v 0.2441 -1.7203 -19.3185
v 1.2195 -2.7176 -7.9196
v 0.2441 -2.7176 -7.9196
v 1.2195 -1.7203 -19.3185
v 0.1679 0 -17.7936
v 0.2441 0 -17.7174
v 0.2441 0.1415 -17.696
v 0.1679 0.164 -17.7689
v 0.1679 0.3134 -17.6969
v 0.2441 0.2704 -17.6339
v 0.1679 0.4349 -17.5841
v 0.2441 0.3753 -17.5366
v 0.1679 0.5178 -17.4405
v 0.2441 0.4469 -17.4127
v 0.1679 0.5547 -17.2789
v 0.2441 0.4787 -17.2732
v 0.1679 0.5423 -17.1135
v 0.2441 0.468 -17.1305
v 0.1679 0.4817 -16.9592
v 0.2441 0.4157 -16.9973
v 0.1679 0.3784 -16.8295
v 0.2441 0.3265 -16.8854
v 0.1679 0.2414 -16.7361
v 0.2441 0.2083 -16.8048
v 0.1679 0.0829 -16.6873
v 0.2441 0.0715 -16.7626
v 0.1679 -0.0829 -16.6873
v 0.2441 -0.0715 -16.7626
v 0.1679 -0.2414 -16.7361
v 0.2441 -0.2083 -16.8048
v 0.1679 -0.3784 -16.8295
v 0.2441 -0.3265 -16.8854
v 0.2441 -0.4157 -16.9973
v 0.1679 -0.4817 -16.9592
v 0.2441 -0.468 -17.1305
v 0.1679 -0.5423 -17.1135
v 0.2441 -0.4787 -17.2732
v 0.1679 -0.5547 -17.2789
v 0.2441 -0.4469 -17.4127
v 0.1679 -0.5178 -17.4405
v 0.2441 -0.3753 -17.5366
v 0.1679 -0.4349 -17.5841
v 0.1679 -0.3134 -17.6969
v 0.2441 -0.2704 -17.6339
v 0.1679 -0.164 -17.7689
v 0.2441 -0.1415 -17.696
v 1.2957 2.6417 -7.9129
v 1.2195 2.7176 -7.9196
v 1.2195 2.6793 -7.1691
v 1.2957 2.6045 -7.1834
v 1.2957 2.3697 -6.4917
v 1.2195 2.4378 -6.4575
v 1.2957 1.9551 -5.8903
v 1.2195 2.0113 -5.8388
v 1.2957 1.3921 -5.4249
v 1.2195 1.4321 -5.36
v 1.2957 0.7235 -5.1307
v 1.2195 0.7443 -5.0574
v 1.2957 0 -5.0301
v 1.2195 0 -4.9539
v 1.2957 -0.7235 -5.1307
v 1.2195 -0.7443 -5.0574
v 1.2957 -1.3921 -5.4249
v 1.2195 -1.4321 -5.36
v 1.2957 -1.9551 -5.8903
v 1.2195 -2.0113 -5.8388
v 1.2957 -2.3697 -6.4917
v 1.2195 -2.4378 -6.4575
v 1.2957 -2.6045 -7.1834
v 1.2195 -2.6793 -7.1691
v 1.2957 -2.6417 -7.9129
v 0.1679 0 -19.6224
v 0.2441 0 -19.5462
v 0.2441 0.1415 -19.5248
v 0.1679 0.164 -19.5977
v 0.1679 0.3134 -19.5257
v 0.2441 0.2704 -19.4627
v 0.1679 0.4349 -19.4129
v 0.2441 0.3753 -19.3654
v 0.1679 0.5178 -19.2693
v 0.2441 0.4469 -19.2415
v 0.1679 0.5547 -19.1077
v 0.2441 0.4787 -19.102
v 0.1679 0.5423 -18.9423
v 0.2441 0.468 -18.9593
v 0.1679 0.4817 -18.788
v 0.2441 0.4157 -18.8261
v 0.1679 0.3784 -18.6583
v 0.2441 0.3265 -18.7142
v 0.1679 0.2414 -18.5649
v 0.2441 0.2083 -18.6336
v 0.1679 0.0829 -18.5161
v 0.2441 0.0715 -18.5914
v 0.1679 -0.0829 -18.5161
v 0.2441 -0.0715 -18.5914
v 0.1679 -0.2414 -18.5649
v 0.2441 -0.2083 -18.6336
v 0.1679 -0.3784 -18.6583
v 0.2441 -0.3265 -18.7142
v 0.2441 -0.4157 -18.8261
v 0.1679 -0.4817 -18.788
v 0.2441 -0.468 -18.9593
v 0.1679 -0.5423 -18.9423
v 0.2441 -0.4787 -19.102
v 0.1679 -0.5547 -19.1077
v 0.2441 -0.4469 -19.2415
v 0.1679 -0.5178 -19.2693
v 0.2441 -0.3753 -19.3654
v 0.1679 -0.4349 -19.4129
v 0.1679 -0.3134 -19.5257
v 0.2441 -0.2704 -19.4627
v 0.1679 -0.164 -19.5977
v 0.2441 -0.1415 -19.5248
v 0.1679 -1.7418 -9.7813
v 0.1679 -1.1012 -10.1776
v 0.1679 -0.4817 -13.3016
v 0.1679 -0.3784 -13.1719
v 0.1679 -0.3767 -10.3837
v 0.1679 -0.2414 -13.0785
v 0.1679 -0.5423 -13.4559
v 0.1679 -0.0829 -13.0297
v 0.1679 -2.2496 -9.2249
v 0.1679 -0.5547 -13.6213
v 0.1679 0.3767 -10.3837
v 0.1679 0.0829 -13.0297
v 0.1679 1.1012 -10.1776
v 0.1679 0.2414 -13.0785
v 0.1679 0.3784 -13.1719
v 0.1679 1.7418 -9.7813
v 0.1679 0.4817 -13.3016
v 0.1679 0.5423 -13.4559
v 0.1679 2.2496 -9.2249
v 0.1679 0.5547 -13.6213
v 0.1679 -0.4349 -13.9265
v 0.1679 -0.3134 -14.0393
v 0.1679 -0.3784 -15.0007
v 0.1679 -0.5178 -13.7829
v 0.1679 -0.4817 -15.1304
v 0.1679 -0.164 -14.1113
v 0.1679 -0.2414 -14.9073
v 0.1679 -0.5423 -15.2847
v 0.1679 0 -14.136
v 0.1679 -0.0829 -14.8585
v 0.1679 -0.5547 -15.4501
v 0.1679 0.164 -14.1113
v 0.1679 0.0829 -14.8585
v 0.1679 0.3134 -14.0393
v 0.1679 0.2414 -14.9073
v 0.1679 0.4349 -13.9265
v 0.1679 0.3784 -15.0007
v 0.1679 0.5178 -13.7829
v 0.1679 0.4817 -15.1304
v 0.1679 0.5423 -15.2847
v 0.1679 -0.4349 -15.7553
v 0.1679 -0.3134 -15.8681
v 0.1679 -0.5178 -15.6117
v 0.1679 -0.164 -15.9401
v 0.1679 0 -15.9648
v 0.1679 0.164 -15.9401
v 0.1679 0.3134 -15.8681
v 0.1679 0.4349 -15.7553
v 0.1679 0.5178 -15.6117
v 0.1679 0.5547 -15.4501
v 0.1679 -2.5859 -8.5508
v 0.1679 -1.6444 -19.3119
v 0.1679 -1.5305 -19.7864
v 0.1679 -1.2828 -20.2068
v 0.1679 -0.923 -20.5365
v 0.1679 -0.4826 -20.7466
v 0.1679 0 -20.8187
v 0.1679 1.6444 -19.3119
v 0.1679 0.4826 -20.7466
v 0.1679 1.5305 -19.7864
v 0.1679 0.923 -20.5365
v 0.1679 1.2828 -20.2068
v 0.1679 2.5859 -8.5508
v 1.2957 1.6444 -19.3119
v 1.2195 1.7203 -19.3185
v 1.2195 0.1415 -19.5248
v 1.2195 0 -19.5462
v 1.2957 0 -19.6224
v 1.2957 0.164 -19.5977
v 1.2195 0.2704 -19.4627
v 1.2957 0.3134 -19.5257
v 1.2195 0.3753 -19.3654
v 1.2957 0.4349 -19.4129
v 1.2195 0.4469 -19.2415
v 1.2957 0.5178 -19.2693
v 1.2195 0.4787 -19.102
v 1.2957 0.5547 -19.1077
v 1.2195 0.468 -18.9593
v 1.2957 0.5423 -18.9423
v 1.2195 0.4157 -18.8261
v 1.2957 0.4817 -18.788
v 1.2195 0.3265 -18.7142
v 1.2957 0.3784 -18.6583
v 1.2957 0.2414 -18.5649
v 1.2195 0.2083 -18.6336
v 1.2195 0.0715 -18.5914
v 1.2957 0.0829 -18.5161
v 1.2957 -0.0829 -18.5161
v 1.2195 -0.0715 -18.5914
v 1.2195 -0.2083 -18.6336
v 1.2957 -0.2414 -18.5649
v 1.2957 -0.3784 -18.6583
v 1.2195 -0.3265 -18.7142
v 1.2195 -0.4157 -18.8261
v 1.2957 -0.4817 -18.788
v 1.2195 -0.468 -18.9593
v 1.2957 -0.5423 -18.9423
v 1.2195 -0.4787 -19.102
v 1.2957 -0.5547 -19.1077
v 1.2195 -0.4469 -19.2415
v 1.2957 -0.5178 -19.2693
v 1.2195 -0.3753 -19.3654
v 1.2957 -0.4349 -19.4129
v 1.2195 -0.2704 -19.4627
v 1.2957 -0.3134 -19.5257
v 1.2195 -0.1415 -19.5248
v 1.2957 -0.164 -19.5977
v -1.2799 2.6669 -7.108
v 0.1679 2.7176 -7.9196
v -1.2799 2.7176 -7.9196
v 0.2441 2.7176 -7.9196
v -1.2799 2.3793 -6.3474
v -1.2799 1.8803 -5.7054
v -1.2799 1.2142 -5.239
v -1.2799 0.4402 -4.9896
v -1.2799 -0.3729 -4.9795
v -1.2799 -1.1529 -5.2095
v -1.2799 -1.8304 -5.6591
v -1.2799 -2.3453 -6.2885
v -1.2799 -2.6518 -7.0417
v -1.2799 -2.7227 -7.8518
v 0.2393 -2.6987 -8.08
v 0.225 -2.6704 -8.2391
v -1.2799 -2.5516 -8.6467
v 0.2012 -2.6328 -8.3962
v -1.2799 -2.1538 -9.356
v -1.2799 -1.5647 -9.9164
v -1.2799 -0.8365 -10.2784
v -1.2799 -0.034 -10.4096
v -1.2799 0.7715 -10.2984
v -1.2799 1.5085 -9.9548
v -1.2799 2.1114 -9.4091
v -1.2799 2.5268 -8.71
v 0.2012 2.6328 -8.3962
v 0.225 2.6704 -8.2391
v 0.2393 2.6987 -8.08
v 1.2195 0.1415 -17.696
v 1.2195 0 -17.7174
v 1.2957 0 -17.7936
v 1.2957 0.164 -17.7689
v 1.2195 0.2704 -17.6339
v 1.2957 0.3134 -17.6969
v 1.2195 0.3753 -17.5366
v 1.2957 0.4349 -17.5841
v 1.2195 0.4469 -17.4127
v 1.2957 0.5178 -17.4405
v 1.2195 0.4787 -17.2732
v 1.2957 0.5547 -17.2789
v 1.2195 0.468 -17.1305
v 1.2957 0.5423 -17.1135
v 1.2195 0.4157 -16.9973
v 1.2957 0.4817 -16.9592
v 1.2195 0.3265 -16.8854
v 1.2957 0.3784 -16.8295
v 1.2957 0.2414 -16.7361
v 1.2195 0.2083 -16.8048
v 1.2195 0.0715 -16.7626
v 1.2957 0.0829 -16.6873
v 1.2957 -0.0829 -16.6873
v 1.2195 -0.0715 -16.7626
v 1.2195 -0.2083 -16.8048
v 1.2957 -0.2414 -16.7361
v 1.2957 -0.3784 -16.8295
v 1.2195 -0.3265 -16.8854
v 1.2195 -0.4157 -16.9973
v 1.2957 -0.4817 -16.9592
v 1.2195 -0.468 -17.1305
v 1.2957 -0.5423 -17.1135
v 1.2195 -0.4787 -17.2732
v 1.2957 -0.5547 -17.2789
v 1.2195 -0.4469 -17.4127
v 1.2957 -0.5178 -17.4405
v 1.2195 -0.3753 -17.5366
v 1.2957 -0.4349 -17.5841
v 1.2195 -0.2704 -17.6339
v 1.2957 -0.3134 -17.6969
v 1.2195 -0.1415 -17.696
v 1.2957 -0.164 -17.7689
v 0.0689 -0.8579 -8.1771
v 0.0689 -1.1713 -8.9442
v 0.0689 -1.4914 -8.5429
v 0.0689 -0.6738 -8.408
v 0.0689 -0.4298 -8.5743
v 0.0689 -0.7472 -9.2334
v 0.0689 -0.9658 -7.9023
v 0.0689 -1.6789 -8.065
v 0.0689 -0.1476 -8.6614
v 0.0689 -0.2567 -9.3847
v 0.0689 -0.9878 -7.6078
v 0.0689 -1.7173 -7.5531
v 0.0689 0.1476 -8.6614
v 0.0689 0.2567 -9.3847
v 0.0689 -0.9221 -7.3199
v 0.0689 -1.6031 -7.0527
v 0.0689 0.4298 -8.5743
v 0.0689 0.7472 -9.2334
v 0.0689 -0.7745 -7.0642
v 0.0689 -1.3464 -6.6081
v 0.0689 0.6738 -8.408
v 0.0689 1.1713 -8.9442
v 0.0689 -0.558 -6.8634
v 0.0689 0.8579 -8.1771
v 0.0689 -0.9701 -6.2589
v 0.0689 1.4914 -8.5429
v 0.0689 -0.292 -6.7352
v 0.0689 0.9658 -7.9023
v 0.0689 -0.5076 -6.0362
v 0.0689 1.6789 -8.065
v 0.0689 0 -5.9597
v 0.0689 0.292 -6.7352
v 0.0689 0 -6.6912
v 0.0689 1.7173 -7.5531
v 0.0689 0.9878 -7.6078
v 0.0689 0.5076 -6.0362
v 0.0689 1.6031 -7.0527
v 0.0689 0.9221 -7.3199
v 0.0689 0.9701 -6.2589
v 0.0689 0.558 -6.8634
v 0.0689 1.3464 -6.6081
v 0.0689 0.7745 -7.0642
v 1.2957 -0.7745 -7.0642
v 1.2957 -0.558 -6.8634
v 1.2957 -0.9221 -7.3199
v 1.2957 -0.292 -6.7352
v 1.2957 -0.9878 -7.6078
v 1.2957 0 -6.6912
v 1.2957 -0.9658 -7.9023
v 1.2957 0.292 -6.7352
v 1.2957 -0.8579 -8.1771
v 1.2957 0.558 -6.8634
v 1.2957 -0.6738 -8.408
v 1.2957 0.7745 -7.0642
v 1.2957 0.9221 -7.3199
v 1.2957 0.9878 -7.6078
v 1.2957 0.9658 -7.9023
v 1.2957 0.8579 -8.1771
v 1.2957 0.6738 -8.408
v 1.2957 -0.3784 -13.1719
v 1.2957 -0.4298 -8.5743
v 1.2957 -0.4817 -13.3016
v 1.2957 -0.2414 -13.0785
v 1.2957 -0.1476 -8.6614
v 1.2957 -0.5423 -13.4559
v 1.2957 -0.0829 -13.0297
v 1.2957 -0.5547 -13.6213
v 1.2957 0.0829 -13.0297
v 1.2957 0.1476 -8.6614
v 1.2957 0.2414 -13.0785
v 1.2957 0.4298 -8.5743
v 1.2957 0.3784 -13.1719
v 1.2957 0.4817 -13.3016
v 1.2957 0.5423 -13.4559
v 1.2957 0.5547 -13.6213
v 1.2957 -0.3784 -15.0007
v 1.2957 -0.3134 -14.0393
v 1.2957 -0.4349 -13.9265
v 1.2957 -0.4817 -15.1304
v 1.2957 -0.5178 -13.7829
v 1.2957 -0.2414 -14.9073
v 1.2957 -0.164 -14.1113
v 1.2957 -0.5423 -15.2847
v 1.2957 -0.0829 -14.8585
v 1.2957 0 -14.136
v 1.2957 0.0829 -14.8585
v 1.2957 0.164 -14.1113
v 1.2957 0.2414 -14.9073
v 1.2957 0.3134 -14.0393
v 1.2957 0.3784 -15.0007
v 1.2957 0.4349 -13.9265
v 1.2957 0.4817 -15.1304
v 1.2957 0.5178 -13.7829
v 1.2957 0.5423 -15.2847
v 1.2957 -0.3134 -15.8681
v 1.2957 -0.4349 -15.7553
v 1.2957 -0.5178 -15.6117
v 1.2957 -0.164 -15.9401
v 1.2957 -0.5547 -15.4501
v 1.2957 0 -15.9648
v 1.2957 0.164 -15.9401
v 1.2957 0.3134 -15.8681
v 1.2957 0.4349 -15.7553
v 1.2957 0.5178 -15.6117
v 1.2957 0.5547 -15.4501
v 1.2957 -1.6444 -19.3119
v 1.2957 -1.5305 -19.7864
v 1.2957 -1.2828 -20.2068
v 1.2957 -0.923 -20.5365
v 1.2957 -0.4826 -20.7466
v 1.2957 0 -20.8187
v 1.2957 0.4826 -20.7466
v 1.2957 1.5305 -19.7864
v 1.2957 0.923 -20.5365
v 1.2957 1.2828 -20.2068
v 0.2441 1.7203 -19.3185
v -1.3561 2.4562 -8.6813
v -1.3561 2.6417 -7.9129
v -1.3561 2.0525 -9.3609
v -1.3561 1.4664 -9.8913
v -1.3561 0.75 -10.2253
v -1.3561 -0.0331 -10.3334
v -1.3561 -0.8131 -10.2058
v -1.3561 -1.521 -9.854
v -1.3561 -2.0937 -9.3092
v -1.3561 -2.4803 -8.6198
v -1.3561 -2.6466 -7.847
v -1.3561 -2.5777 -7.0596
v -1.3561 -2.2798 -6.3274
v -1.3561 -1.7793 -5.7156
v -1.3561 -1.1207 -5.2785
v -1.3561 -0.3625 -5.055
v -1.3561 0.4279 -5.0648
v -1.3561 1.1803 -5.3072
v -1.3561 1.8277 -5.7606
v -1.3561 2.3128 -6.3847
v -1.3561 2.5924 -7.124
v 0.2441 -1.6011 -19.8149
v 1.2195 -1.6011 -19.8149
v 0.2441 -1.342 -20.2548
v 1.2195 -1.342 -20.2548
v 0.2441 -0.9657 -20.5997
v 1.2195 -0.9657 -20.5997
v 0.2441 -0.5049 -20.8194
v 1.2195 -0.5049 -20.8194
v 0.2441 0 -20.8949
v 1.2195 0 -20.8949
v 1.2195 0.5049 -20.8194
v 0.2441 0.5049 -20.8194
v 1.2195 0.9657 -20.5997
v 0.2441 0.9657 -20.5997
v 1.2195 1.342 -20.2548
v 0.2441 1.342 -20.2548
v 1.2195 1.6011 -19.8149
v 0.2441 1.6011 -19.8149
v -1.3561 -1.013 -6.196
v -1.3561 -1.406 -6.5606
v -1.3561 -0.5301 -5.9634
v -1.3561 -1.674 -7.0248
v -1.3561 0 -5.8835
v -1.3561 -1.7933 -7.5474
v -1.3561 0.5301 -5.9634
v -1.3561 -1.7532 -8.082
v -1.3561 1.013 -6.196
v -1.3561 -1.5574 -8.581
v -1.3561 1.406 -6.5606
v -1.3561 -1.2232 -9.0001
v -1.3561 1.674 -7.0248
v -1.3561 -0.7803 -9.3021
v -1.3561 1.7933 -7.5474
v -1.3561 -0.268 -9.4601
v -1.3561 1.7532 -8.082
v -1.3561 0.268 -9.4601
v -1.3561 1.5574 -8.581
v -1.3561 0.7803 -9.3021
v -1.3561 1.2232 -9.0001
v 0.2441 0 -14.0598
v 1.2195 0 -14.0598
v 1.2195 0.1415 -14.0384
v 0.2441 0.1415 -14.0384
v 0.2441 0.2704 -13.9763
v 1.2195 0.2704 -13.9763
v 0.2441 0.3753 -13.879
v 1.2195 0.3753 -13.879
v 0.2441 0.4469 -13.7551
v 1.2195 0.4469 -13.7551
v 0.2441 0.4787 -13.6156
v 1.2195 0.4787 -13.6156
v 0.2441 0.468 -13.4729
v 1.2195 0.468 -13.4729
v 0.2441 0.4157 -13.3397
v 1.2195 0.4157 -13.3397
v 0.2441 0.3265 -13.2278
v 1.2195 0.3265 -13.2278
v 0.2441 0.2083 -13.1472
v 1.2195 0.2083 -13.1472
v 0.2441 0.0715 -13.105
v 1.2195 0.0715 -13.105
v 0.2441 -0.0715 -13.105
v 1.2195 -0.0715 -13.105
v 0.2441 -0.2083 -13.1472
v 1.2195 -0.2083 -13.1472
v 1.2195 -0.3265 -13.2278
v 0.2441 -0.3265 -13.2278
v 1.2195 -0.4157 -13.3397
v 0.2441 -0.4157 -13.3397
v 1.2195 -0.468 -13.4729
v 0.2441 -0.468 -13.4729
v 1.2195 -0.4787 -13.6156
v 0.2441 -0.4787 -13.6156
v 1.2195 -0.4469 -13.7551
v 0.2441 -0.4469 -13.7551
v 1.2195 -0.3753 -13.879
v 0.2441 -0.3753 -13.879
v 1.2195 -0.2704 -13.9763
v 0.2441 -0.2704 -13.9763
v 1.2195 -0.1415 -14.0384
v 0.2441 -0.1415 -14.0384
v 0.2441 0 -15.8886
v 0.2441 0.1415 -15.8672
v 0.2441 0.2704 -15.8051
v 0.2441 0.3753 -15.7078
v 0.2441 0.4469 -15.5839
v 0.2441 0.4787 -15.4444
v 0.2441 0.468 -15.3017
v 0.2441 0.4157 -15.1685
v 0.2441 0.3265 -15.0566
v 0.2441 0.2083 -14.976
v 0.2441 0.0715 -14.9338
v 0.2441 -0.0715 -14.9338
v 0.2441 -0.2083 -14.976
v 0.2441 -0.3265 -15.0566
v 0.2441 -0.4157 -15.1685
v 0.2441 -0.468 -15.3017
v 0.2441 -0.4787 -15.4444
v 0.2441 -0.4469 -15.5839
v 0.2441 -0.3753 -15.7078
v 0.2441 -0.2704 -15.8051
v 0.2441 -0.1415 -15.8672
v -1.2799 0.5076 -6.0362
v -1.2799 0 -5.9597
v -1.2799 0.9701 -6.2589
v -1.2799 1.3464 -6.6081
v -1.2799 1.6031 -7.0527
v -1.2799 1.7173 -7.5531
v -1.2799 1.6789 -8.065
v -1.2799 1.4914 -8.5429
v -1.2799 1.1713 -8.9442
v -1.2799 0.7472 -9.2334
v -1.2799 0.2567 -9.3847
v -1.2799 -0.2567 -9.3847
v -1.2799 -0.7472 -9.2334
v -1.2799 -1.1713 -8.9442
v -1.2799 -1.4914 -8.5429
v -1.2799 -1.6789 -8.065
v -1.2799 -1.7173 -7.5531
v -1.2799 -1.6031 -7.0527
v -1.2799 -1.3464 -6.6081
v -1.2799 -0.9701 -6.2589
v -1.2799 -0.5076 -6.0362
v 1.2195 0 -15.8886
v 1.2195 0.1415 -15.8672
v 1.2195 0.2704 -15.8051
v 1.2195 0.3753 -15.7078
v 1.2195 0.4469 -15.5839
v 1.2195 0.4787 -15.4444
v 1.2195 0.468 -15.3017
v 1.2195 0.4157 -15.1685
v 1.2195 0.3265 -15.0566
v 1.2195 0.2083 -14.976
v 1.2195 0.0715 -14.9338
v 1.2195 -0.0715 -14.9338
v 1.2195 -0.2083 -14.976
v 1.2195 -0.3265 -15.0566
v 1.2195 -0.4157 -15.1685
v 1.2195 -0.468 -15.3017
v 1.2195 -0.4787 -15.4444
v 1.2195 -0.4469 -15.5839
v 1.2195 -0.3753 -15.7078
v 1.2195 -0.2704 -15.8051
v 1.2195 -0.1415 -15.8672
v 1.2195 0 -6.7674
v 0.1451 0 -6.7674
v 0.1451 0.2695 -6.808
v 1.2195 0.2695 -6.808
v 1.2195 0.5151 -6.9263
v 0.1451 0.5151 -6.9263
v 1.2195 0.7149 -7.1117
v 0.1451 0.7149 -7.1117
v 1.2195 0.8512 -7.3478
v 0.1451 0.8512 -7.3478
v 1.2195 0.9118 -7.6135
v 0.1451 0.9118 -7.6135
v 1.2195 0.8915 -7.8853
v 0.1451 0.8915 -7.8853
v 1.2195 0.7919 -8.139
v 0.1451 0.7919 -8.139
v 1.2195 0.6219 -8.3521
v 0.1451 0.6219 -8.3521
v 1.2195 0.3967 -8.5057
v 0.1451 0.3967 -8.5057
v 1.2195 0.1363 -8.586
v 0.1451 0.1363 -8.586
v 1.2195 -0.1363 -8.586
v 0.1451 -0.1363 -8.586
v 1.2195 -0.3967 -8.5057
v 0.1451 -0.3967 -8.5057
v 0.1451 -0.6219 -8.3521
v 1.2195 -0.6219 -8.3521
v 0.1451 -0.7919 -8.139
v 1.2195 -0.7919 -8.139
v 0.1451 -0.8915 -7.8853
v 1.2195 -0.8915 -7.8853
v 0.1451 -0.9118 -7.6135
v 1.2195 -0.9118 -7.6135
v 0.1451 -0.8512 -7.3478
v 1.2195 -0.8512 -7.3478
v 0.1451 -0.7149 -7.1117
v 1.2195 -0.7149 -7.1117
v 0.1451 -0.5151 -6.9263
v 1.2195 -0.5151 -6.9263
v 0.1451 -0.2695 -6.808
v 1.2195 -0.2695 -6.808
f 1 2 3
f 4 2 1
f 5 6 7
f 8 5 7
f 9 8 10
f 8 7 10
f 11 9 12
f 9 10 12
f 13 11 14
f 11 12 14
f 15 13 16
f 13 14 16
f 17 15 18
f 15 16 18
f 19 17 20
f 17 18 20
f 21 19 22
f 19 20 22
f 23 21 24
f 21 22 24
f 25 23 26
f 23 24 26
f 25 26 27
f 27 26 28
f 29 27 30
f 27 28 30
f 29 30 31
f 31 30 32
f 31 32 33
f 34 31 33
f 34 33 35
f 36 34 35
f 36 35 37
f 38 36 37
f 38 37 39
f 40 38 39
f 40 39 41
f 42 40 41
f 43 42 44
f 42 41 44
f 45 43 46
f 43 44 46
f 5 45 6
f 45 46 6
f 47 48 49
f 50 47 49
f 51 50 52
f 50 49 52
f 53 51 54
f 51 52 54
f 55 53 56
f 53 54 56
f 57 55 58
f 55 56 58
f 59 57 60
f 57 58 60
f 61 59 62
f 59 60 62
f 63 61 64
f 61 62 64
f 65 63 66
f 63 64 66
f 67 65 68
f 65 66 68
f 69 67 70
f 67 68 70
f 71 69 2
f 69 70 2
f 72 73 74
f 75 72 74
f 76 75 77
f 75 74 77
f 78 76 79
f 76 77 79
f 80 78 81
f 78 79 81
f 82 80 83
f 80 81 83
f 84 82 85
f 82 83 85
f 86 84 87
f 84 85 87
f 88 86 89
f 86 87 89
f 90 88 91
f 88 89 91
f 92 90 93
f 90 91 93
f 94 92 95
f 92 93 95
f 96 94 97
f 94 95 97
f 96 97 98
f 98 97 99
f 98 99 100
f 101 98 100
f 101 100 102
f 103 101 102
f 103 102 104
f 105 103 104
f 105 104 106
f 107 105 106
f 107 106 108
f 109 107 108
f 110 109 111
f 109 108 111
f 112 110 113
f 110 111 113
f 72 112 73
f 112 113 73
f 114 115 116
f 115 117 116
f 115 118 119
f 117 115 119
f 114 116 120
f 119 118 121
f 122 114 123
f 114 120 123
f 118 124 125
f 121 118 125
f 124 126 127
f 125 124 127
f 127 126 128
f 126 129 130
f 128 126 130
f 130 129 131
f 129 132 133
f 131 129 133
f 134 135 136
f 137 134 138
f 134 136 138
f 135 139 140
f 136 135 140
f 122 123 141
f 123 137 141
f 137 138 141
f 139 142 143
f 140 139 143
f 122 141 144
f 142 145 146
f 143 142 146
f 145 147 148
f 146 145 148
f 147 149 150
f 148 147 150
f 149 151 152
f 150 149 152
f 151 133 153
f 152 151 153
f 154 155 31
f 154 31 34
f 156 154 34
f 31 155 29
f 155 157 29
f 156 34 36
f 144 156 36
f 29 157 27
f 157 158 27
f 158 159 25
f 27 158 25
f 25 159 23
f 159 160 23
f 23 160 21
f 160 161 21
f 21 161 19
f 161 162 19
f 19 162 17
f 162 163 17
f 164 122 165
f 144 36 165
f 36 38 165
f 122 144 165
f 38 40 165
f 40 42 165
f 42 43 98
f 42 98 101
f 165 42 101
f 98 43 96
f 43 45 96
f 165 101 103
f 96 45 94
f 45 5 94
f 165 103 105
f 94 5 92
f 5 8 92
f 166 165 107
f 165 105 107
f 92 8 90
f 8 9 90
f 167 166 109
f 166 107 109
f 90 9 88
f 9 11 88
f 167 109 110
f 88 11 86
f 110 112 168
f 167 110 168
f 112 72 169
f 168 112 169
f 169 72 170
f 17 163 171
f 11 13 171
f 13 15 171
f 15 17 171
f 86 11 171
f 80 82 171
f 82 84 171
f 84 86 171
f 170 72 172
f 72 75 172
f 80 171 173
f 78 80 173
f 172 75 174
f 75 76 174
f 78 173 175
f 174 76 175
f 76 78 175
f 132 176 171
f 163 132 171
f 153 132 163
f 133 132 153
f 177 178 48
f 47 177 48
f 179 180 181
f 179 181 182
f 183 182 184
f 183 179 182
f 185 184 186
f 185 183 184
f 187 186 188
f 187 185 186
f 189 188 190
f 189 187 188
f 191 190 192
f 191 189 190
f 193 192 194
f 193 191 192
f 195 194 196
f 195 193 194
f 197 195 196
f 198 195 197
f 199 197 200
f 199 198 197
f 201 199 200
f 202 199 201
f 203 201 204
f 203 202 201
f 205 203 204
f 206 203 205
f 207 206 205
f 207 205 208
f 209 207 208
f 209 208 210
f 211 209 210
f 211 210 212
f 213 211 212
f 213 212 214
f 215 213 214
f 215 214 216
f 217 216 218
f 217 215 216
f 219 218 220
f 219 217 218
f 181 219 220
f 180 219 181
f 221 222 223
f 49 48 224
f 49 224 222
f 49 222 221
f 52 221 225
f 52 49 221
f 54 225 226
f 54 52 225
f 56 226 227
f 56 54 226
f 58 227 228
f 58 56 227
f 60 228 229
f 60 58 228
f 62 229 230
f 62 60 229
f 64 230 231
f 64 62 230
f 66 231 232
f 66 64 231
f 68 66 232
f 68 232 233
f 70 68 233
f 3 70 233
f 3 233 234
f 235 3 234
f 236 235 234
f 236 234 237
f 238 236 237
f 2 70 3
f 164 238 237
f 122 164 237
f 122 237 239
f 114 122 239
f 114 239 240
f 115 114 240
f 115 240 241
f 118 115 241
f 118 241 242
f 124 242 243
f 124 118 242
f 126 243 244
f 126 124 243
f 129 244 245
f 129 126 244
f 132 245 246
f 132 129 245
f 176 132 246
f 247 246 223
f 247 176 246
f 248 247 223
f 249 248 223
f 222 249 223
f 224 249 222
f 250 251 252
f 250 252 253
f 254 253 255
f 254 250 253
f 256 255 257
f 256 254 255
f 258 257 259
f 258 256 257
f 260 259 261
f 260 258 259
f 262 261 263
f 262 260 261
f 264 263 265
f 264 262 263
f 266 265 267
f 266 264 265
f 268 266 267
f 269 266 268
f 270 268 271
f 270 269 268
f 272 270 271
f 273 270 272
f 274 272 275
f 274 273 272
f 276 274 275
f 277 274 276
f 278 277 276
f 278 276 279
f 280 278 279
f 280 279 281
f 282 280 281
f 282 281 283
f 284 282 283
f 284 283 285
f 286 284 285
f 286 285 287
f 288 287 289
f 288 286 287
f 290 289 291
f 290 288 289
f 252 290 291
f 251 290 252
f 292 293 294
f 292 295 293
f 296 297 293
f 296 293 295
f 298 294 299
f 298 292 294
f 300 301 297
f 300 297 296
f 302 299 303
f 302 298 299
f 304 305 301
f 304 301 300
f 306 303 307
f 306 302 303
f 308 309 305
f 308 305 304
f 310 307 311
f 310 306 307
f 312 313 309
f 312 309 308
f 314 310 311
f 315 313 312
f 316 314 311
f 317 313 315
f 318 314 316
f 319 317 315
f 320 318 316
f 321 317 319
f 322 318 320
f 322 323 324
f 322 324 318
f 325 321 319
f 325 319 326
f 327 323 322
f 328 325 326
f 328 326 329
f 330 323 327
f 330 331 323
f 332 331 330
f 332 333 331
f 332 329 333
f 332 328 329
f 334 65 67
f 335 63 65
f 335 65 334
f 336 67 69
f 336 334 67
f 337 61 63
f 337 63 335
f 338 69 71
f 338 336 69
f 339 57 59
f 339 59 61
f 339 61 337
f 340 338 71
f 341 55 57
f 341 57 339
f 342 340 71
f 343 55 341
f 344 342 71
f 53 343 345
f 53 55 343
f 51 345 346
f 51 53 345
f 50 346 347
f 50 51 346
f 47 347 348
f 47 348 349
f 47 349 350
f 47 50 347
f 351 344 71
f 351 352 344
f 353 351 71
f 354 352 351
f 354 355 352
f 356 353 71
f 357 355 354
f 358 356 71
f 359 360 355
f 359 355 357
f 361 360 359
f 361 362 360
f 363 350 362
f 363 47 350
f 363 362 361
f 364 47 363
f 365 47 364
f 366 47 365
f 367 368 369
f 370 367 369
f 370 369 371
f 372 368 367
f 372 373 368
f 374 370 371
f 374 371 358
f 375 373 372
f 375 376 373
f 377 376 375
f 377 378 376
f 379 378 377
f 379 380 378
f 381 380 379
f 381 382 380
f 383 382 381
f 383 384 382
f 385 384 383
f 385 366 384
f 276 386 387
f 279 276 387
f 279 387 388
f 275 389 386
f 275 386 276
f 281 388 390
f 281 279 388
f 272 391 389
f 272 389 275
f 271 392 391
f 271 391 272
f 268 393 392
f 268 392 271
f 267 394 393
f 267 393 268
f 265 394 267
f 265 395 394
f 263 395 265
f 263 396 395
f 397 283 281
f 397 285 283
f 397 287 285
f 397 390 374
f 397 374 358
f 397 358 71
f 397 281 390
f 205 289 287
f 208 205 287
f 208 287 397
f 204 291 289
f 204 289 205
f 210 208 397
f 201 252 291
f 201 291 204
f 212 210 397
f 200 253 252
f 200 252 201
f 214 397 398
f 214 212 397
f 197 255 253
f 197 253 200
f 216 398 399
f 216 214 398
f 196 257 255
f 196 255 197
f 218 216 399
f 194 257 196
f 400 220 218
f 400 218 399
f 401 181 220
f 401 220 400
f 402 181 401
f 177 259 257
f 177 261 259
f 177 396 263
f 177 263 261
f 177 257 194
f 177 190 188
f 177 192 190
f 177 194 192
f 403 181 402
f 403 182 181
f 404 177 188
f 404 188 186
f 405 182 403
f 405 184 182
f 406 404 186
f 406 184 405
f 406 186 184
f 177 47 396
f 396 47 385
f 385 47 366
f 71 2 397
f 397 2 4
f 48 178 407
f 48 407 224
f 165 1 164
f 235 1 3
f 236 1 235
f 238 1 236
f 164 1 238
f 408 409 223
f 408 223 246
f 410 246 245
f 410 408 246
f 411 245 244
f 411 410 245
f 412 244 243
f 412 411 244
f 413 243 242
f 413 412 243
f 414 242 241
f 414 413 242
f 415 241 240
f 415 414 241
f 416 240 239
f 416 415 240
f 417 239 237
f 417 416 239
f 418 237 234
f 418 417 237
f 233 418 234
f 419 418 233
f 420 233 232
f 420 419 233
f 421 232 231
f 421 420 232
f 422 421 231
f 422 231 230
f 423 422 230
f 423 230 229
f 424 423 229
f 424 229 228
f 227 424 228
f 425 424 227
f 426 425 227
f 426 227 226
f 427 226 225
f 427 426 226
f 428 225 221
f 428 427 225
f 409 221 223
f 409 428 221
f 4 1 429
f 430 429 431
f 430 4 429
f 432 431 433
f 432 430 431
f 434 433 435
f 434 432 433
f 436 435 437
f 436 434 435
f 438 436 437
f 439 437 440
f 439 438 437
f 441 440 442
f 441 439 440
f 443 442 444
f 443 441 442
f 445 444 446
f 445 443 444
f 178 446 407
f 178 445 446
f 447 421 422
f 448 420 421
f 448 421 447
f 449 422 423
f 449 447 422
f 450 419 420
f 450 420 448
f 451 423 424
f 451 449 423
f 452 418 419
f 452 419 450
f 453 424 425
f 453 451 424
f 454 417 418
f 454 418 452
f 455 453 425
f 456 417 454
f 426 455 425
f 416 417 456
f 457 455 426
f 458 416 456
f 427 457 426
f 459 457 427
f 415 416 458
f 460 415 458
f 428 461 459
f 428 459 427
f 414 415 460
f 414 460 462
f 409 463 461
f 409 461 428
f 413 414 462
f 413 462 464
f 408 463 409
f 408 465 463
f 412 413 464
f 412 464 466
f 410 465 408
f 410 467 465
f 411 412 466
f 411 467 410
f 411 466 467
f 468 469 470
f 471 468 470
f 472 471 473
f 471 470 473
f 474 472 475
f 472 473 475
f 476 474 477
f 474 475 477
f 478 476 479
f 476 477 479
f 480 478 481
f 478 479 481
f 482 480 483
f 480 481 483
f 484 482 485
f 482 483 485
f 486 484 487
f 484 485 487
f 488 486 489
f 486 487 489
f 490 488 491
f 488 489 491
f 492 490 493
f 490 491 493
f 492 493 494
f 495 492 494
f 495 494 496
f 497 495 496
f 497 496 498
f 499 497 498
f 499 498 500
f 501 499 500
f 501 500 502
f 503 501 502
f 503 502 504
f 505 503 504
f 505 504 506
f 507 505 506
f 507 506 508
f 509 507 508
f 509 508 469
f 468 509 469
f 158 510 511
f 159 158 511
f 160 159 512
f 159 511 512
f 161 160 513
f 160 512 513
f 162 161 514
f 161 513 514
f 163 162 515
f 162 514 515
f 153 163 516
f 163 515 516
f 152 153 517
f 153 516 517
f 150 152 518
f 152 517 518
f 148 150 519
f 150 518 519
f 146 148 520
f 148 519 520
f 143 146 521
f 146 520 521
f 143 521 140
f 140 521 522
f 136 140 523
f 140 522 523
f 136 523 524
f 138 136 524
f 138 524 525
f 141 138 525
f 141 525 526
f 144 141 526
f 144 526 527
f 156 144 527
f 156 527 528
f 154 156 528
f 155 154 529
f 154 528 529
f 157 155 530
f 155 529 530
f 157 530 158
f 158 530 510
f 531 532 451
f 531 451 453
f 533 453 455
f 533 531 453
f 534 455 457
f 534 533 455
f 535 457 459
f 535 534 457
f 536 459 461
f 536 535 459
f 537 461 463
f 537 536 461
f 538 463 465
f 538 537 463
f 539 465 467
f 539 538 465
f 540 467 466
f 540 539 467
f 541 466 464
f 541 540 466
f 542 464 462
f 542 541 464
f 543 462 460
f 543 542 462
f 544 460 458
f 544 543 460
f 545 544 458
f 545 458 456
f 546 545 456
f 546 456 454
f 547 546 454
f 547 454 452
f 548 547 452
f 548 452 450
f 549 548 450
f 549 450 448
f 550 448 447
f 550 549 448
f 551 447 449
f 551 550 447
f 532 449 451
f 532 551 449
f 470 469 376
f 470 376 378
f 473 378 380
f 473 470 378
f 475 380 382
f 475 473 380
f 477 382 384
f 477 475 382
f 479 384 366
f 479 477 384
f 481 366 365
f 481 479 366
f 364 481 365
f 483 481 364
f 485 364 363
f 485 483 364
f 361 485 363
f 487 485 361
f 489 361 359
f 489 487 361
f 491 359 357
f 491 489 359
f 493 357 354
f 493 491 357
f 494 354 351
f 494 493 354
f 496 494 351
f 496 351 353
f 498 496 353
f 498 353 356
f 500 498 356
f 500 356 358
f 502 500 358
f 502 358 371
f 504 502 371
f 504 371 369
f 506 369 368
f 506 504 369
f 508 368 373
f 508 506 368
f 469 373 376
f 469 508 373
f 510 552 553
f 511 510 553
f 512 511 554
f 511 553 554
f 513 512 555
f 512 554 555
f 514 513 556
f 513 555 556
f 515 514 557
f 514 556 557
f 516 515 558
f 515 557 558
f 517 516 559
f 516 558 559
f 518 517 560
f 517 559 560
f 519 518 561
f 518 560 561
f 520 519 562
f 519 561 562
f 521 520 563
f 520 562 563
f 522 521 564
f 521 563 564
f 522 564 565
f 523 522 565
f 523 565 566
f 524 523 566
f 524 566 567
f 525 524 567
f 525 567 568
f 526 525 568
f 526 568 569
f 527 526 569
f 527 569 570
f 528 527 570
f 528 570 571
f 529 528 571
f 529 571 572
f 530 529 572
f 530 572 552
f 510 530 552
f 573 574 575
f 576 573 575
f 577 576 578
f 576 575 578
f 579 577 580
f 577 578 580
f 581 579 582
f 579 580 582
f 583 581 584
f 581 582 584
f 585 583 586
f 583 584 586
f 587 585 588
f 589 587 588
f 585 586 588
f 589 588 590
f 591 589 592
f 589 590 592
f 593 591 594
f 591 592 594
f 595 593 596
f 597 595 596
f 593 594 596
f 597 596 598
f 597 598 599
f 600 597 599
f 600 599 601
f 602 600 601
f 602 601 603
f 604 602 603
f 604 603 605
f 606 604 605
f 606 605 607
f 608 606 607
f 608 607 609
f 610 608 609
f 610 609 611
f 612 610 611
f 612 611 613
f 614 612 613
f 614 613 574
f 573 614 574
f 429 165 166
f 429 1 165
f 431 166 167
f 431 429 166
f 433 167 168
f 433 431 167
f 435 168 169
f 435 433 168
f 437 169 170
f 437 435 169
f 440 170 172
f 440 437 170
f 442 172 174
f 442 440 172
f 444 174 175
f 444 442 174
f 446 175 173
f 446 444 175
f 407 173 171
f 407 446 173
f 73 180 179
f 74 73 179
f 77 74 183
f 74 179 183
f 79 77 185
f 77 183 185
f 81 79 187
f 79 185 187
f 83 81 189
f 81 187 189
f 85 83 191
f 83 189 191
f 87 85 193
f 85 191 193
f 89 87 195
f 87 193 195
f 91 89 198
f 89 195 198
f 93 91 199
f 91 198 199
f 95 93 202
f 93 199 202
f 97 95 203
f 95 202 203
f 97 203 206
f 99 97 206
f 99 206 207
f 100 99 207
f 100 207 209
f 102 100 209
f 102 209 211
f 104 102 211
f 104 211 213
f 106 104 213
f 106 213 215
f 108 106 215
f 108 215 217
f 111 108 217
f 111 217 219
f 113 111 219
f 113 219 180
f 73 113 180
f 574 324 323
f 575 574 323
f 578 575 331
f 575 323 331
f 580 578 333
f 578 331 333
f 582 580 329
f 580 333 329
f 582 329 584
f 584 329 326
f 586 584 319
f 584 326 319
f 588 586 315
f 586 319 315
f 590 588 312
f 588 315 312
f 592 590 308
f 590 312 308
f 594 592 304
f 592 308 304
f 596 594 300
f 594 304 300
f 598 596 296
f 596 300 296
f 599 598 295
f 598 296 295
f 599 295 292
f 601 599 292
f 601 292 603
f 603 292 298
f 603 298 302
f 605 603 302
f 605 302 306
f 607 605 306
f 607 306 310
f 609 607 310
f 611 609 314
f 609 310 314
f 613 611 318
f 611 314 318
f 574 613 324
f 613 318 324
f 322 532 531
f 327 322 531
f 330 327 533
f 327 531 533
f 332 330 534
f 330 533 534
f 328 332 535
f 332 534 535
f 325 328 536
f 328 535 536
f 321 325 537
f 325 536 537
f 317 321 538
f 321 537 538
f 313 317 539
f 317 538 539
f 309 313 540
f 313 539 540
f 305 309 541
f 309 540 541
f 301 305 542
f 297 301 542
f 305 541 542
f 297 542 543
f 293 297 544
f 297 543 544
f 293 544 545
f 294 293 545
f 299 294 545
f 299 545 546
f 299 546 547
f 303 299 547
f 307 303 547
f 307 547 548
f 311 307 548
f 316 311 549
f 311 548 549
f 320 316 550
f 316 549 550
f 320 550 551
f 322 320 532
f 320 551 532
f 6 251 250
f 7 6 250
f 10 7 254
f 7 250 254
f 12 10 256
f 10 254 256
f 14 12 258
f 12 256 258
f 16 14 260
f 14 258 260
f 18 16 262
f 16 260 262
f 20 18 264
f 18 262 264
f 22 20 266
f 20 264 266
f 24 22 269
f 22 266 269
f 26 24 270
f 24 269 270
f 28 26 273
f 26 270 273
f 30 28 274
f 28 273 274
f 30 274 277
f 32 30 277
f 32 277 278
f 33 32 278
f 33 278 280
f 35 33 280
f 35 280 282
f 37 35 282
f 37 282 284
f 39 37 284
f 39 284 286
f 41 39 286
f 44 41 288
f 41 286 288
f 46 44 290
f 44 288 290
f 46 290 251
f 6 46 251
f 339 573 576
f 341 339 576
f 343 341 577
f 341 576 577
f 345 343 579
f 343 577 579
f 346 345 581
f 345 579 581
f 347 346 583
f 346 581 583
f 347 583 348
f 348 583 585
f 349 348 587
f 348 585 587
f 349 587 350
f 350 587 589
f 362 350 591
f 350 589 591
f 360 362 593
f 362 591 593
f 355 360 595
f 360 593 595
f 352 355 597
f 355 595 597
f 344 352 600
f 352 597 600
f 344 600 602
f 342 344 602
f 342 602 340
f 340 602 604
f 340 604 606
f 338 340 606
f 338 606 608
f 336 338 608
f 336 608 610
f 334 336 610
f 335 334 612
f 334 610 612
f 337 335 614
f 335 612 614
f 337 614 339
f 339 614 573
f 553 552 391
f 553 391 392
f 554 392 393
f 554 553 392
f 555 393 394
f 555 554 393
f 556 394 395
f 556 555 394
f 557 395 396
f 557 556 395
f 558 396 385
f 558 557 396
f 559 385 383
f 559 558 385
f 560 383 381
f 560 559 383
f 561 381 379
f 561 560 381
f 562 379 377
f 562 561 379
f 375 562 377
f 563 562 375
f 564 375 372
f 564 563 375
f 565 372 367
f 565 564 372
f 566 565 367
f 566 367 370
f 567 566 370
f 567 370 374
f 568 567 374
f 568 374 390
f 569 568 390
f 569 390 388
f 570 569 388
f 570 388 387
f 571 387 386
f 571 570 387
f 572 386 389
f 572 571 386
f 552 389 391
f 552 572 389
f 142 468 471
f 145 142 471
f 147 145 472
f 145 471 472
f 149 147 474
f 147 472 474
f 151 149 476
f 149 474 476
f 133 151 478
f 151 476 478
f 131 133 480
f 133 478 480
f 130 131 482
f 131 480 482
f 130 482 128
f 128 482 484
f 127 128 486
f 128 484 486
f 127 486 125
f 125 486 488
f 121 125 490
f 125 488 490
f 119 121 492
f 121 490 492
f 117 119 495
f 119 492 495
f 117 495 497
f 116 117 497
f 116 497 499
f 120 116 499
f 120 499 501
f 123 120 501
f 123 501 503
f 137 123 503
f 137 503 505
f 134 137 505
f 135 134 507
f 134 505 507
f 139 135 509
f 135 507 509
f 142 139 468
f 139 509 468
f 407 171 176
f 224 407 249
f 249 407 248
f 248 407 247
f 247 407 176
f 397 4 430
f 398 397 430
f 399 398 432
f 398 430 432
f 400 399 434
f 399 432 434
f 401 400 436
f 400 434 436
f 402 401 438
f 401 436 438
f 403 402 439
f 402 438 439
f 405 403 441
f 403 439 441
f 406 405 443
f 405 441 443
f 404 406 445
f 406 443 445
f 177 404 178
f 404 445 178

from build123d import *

# Parameters (mm, degrees)
BOSS_EXTRUDE1_DEPTH = 2.9972
CUT_EXTRUDE1_DEPTH  = 1.524
SKETCH6_R           = 1.1176
CUT_EXTRUDE3_DEPTH  = 29.630171982
CUT_EXTRUDE4_DEPTH  = 7.62
BOSS_EXTRUDE2_START = 0.4064
SKETCH9_R           = 1.1176
BOSS_EXTRUDE2_DEPTH = 0.4064
SKETCH10_R          = 1.1176
SKETCH10_R_2        = 0.8001
BOSS_EXTRUDE3_DEPTH = 1.8796
SKETCH11_R          = 4.5466
BOSS_EXTRUDE4_DEPTH = 2.54
SKETCH12_R          = 2.8702
CUT_EXTRUDE5_DEPTH  = 2.3749
SKETCH13_R          = 1.524
CUT_EXTRUDE6_DEPTH  = 28.807597626
SKETCH14_R          = 0.8001
CUT_EXTRUDE7_DEPTH  = 29.056286281
CHAMFER1_SIZE       = 0.127
CHAMFER2_SIZE       = 0.127
CHAMFER3_SIZE       = 0.127
SCALE1_SCALE        = 0.6


with BuildPart() as part:
    # Sketch1 → Boss-Extrude1 (new body)
    with BuildSketch(Plane(origin=(0, 0, 0), x_dir=(0, 0, -1), z_dir=(1, 0, 0))):
        with BuildLine():
            Line((24.769539012, 3.626266444), (5.771274976, 5.288399174))
            ThreePointArc((5.771274976, 5.288399174), (0, 0), (5.771274976, -5.288399174))
            Line((5.771274976, -5.288399174), (24.769539012, -3.626266444))
            ThreePointArc((24.769539012, -3.626266444), (28.0924, 0), (24.769539012, 3.626266444))
        make_face()
    extrude(amount=BOSS_EXTRUDE1_DEPTH)

    # Sketch4 → Cut-Extrude1 (cut)
    with BuildSketch(Plane(origin=(2.9972, 0, 0), x_dir=(0, 0, -1), z_dir=(1, 0, 0))):
        with BuildLine():
            Line((24.703126336, 2.867166085), (5.7048623, 4.529298814))
            ThreePointArc((5.7048623, 4.529298814), (0.762, 0), (5.7048623, -4.529298814))
            Line((5.7048623, -4.529298814), (24.703126336, -2.867166085))
            ThreePointArc((24.703126336, -2.867166085), (27.3304, 0), (24.703126336, 2.867166085))
        make_face()
    extrude(amount=-CUT_EXTRUDE1_DEPTH, mode=Mode.SUBTRACT)

    # Sketch6 → Cut-Extrude3 (cut, through all)
    with BuildSketch(Plane(origin=(1.4732, 0, 0), x_dir=(0, 0, -1), z_dir=(1, 0, 0))):
        with Locations((21.2344, 0)):
            Circle(SKETCH6_R)
    extrude(amount=-CUT_EXTRUDE3_DEPTH, mode=Mode.SUBTRACT)

    # Sketch7 → Cut-Extrude4 (cut)
    with BuildSketch(Plane(origin=(2.9972, 0, 0), x_dir=(0, 0, -1), z_dir=(1, 0, 0))):
        with BuildLine():
            Line((5.771274976, -5.288399174), (24.769539012, -3.626266444))
            ThreePointArc((24.769539012, -3.626266444), (28.0924, 0), (24.769539012, 3.626266444))
            Line((24.769539012, 3.626266444), (5.771274976, 5.288399174))
            ThreePointArc((5.771274976, 5.288399174), (0, 0), (5.771274976, -5.288399174))
        make_face()
        with BuildLine():
            Line((24.703126336, 2.867166085), (5.7048623, 4.529298814))
            ThreePointArc((5.7048623, 4.529298814), (0.762, 0), (5.7048623, -4.529298814))
            Line((5.7048623, -4.529298814), (24.703126336, -2.867166085))
            ThreePointArc((24.703126336, -2.867166085), (27.3304, 0), (24.703126336, 2.867166085))
        make_face(mode=Mode.SUBTRACT)
    extrude(amount=-CUT_EXTRUDE4_DEPTH, mode=Mode.SUBTRACT)

    # Sketch9 → Boss-Extrude2 (add)
    with BuildSketch(Plane(origin=(1.4732, 0, 0), x_dir=(0, 0, -1), z_dir=(1, 0, 0)).offset(BOSS_EXTRUDE2_START)):
        with BuildLine():
            Line((24.703126336, 2.867166085), (5.7048623, 4.529298814))
            ThreePointArc((5.7048623, 4.529298814), (0.762, 0), (5.7048623, -4.529298814))
            Line((5.7048623, -4.529298814), (24.703126336, -2.867166085))
            ThreePointArc((24.703126336, -2.867166085), (27.3304, 0), (24.703126336, 2.867166085))
        make_face()
        with Locations((21.2344, 0)):
            Circle(SKETCH9_R, mode=Mode.SUBTRACT)
    extrude(amount=-BOSS_EXTRUDE2_DEPTH)

    # Sketch10 → Boss-Extrude3 (add)
    with BuildSketch(Plane(origin=(1.8796, 0, 0), x_dir=(0, 0, -1), z_dir=(1, 0, 0))):
        with Locations((21.2344, 0)):
            Circle(SKETCH10_R)
        with Locations((21.2344, 0)):
            Circle(SKETCH10_R_2, mode=Mode.SUBTRACT)
    extrude(amount=-BOSS_EXTRUDE3_DEPTH)

    # Sketch11 → Boss-Extrude4 (add)
    with BuildSketch(Plane.ZY):
        with Locations(Location((-5.3086, 0, 0), (0, 0, 95))):
            Circle(SKETCH11_R)
    extrude(amount=BOSS_EXTRUDE4_DEPTH)

    # Sketch12 → Cut-Extrude5 (cut)
    with BuildSketch(Plane.ZY.offset(2.54)):
        with Locations((-5.3086, 0)):
            Circle(SKETCH12_R)
    extrude(amount=-CUT_EXTRUDE5_DEPTH, mode=Mode.SUBTRACT)

    # Sketch13 → Cut-Extrude6 (cut, through all)
    with BuildSketch(Plane.ZY.offset(0.1651)):
        with Locations((-5.3086, 0)):
            Circle(SKETCH13_R)
    extrude(amount=-CUT_EXTRUDE6_DEPTH, mode=Mode.SUBTRACT)

    # Sketch14 → Cut-Extrude7 (cut, through all)
    with BuildSketch(Plane(origin=(1.8796, 0, 0), x_dir=(0, 0, -1), z_dir=(1, 0, 0))):
        with Locations((18.1864, 0)):
            Circle(SKETCH14_R)
        with Locations((15.1384, 0)):
            Circle(SKETCH14_R)
        with Locations((24.2824, 0)):
            Circle(SKETCH14_R)
    extrude(amount=-CUT_EXTRUDE7_DEPTH, mode=Mode.SUBTRACT)

    # Chamfer1
    chamfer1_edges = [part.edges().sort_by_distance(p)[0] for p in [
        (-2.54, -4.529298814, -4.9123377),
        (-2.54, 0, -8.1788),
        (1.8796, 0, -6.8326),
        (-0.1651, 0, -6.8326),
    ]]
    chamfer(chamfer1_edges, length=CHAMFER1_SIZE)

    # Chamfer2
    chamfer2_edges = [part.edges().sort_by_distance(p)[0] for p in [
        (0, 0, -17.3863),
        (1.8796, 0, -17.3863),
        (0, 0, -14.3383),
        (1.8796, 0, -14.3383),
        (0, 0, -23.4823),
        (1.8796, 0, -23.4823),
        (1.8796, 0, -27.3304),
        (1.8796, 3.698232449, -15.203994318),
        (1.8796, 0, -0.762),
        (1.8796, -3.698232449, -15.203994318),
        (0, 0, -20.4343),
        (1.8796, 0, -20.4343),
    ]]
    chamfer(chamfer2_edges, length=CHAMFER2_SIZE)

    # Chamfer3
    # the kernel refuses this chamfer: 0.127 mm, written as the material it takes off along each edge
    with BuildSketch(Plane(origin=(0, -4.557764206, -5.379501386), x_dir=(0.9996219169112968, -0.027391246498850615, -0.002396423548493402), z_dir=(0, 0.08715574274765155, -0.9961946980917461))) as chamfer3_piece_1_section:
        Polygon((CHAMFER3_SIZE * 0.999621916911, -CHAMFER3_SIZE * 0.0274958766106), (-CHAMFER3_SIZE * 0.0274958766106, -CHAMFER3_SIZE * 0.999621916911), (0, 0), align=None)
    chamfer3_piece_1 = extrude(amount=19.397438057, mode=Mode.PRIVATE)
    chamfer3_piece_1 = chamfer3_piece_1 - Plane(origin=(0.042171089, 0, -5.3086), x_dir=(0, 0.9961946980917455, -0.08715574274765824), z_dir=(1, 0, 0)) * Cylinder(4.5466, 40, mode=Mode.PRIVATE)
    add(chamfer3_piece_1, mode=Mode.SUBTRACT)
    with BuildSketch(Plane(origin=(0, 2.867166085, -24.703126336), x_dir=(-0.027495876610586393, -0.9958180537233419, 0.08712279063523509), z_dir=(0, 0.08715574274765134, 0.9961946980917462))) as chamfer3_piece_2_section:
        Polygon((CHAMFER3_SIZE * 0.999621916911, CHAMFER3_SIZE * 0.0274958766106), (-CHAMFER3_SIZE * 0.0274958766106, CHAMFER3_SIZE * 0.999621916911), (0, 0), align=None)
    chamfer3_piece_2 = extrude(amount=19.397438057, mode=Mode.PRIVATE)
    chamfer3_piece_2 = chamfer3_piece_2 - Plane(origin=(0.042171094, 0, -5.3086), x_dir=(0, 0.9961946980917455, -0.08715574274765824), z_dir=(1, 0, 0)) * Cylinder(4.5466, 40, mode=Mode.PRIVATE)
    add(chamfer3_piece_2, mode=Mode.SUBTRACT)
    with BuildSketch(Plane(origin=(0, 0, -24.452281807), x_dir=(0, -0.996194698091746, -0.08715574274765267), z_dir=(0, -0.08715574274765267, 0.996194698091746))) as chamfer3_piece_3:
        Polygon((2.878118193 - CHAMFER3_SIZE, 0), (2.878118193, CHAMFER3_SIZE), (2.878118193, 0), align=None)
    revolve(axis=Axis((0, 0, -24.452281807), (1, 0, 0)), revolution_arc=170, mode=Mode.SUBTRACT)


with BuildPart() as part_1:
    # Scale1: scaled about (0.419801812, 0, -11.241664116)
    add(part.part.scale(SCALE1_SCALE).moved(Location((0.167920725, 0, -4.496665646))))


solid = part_1.part
